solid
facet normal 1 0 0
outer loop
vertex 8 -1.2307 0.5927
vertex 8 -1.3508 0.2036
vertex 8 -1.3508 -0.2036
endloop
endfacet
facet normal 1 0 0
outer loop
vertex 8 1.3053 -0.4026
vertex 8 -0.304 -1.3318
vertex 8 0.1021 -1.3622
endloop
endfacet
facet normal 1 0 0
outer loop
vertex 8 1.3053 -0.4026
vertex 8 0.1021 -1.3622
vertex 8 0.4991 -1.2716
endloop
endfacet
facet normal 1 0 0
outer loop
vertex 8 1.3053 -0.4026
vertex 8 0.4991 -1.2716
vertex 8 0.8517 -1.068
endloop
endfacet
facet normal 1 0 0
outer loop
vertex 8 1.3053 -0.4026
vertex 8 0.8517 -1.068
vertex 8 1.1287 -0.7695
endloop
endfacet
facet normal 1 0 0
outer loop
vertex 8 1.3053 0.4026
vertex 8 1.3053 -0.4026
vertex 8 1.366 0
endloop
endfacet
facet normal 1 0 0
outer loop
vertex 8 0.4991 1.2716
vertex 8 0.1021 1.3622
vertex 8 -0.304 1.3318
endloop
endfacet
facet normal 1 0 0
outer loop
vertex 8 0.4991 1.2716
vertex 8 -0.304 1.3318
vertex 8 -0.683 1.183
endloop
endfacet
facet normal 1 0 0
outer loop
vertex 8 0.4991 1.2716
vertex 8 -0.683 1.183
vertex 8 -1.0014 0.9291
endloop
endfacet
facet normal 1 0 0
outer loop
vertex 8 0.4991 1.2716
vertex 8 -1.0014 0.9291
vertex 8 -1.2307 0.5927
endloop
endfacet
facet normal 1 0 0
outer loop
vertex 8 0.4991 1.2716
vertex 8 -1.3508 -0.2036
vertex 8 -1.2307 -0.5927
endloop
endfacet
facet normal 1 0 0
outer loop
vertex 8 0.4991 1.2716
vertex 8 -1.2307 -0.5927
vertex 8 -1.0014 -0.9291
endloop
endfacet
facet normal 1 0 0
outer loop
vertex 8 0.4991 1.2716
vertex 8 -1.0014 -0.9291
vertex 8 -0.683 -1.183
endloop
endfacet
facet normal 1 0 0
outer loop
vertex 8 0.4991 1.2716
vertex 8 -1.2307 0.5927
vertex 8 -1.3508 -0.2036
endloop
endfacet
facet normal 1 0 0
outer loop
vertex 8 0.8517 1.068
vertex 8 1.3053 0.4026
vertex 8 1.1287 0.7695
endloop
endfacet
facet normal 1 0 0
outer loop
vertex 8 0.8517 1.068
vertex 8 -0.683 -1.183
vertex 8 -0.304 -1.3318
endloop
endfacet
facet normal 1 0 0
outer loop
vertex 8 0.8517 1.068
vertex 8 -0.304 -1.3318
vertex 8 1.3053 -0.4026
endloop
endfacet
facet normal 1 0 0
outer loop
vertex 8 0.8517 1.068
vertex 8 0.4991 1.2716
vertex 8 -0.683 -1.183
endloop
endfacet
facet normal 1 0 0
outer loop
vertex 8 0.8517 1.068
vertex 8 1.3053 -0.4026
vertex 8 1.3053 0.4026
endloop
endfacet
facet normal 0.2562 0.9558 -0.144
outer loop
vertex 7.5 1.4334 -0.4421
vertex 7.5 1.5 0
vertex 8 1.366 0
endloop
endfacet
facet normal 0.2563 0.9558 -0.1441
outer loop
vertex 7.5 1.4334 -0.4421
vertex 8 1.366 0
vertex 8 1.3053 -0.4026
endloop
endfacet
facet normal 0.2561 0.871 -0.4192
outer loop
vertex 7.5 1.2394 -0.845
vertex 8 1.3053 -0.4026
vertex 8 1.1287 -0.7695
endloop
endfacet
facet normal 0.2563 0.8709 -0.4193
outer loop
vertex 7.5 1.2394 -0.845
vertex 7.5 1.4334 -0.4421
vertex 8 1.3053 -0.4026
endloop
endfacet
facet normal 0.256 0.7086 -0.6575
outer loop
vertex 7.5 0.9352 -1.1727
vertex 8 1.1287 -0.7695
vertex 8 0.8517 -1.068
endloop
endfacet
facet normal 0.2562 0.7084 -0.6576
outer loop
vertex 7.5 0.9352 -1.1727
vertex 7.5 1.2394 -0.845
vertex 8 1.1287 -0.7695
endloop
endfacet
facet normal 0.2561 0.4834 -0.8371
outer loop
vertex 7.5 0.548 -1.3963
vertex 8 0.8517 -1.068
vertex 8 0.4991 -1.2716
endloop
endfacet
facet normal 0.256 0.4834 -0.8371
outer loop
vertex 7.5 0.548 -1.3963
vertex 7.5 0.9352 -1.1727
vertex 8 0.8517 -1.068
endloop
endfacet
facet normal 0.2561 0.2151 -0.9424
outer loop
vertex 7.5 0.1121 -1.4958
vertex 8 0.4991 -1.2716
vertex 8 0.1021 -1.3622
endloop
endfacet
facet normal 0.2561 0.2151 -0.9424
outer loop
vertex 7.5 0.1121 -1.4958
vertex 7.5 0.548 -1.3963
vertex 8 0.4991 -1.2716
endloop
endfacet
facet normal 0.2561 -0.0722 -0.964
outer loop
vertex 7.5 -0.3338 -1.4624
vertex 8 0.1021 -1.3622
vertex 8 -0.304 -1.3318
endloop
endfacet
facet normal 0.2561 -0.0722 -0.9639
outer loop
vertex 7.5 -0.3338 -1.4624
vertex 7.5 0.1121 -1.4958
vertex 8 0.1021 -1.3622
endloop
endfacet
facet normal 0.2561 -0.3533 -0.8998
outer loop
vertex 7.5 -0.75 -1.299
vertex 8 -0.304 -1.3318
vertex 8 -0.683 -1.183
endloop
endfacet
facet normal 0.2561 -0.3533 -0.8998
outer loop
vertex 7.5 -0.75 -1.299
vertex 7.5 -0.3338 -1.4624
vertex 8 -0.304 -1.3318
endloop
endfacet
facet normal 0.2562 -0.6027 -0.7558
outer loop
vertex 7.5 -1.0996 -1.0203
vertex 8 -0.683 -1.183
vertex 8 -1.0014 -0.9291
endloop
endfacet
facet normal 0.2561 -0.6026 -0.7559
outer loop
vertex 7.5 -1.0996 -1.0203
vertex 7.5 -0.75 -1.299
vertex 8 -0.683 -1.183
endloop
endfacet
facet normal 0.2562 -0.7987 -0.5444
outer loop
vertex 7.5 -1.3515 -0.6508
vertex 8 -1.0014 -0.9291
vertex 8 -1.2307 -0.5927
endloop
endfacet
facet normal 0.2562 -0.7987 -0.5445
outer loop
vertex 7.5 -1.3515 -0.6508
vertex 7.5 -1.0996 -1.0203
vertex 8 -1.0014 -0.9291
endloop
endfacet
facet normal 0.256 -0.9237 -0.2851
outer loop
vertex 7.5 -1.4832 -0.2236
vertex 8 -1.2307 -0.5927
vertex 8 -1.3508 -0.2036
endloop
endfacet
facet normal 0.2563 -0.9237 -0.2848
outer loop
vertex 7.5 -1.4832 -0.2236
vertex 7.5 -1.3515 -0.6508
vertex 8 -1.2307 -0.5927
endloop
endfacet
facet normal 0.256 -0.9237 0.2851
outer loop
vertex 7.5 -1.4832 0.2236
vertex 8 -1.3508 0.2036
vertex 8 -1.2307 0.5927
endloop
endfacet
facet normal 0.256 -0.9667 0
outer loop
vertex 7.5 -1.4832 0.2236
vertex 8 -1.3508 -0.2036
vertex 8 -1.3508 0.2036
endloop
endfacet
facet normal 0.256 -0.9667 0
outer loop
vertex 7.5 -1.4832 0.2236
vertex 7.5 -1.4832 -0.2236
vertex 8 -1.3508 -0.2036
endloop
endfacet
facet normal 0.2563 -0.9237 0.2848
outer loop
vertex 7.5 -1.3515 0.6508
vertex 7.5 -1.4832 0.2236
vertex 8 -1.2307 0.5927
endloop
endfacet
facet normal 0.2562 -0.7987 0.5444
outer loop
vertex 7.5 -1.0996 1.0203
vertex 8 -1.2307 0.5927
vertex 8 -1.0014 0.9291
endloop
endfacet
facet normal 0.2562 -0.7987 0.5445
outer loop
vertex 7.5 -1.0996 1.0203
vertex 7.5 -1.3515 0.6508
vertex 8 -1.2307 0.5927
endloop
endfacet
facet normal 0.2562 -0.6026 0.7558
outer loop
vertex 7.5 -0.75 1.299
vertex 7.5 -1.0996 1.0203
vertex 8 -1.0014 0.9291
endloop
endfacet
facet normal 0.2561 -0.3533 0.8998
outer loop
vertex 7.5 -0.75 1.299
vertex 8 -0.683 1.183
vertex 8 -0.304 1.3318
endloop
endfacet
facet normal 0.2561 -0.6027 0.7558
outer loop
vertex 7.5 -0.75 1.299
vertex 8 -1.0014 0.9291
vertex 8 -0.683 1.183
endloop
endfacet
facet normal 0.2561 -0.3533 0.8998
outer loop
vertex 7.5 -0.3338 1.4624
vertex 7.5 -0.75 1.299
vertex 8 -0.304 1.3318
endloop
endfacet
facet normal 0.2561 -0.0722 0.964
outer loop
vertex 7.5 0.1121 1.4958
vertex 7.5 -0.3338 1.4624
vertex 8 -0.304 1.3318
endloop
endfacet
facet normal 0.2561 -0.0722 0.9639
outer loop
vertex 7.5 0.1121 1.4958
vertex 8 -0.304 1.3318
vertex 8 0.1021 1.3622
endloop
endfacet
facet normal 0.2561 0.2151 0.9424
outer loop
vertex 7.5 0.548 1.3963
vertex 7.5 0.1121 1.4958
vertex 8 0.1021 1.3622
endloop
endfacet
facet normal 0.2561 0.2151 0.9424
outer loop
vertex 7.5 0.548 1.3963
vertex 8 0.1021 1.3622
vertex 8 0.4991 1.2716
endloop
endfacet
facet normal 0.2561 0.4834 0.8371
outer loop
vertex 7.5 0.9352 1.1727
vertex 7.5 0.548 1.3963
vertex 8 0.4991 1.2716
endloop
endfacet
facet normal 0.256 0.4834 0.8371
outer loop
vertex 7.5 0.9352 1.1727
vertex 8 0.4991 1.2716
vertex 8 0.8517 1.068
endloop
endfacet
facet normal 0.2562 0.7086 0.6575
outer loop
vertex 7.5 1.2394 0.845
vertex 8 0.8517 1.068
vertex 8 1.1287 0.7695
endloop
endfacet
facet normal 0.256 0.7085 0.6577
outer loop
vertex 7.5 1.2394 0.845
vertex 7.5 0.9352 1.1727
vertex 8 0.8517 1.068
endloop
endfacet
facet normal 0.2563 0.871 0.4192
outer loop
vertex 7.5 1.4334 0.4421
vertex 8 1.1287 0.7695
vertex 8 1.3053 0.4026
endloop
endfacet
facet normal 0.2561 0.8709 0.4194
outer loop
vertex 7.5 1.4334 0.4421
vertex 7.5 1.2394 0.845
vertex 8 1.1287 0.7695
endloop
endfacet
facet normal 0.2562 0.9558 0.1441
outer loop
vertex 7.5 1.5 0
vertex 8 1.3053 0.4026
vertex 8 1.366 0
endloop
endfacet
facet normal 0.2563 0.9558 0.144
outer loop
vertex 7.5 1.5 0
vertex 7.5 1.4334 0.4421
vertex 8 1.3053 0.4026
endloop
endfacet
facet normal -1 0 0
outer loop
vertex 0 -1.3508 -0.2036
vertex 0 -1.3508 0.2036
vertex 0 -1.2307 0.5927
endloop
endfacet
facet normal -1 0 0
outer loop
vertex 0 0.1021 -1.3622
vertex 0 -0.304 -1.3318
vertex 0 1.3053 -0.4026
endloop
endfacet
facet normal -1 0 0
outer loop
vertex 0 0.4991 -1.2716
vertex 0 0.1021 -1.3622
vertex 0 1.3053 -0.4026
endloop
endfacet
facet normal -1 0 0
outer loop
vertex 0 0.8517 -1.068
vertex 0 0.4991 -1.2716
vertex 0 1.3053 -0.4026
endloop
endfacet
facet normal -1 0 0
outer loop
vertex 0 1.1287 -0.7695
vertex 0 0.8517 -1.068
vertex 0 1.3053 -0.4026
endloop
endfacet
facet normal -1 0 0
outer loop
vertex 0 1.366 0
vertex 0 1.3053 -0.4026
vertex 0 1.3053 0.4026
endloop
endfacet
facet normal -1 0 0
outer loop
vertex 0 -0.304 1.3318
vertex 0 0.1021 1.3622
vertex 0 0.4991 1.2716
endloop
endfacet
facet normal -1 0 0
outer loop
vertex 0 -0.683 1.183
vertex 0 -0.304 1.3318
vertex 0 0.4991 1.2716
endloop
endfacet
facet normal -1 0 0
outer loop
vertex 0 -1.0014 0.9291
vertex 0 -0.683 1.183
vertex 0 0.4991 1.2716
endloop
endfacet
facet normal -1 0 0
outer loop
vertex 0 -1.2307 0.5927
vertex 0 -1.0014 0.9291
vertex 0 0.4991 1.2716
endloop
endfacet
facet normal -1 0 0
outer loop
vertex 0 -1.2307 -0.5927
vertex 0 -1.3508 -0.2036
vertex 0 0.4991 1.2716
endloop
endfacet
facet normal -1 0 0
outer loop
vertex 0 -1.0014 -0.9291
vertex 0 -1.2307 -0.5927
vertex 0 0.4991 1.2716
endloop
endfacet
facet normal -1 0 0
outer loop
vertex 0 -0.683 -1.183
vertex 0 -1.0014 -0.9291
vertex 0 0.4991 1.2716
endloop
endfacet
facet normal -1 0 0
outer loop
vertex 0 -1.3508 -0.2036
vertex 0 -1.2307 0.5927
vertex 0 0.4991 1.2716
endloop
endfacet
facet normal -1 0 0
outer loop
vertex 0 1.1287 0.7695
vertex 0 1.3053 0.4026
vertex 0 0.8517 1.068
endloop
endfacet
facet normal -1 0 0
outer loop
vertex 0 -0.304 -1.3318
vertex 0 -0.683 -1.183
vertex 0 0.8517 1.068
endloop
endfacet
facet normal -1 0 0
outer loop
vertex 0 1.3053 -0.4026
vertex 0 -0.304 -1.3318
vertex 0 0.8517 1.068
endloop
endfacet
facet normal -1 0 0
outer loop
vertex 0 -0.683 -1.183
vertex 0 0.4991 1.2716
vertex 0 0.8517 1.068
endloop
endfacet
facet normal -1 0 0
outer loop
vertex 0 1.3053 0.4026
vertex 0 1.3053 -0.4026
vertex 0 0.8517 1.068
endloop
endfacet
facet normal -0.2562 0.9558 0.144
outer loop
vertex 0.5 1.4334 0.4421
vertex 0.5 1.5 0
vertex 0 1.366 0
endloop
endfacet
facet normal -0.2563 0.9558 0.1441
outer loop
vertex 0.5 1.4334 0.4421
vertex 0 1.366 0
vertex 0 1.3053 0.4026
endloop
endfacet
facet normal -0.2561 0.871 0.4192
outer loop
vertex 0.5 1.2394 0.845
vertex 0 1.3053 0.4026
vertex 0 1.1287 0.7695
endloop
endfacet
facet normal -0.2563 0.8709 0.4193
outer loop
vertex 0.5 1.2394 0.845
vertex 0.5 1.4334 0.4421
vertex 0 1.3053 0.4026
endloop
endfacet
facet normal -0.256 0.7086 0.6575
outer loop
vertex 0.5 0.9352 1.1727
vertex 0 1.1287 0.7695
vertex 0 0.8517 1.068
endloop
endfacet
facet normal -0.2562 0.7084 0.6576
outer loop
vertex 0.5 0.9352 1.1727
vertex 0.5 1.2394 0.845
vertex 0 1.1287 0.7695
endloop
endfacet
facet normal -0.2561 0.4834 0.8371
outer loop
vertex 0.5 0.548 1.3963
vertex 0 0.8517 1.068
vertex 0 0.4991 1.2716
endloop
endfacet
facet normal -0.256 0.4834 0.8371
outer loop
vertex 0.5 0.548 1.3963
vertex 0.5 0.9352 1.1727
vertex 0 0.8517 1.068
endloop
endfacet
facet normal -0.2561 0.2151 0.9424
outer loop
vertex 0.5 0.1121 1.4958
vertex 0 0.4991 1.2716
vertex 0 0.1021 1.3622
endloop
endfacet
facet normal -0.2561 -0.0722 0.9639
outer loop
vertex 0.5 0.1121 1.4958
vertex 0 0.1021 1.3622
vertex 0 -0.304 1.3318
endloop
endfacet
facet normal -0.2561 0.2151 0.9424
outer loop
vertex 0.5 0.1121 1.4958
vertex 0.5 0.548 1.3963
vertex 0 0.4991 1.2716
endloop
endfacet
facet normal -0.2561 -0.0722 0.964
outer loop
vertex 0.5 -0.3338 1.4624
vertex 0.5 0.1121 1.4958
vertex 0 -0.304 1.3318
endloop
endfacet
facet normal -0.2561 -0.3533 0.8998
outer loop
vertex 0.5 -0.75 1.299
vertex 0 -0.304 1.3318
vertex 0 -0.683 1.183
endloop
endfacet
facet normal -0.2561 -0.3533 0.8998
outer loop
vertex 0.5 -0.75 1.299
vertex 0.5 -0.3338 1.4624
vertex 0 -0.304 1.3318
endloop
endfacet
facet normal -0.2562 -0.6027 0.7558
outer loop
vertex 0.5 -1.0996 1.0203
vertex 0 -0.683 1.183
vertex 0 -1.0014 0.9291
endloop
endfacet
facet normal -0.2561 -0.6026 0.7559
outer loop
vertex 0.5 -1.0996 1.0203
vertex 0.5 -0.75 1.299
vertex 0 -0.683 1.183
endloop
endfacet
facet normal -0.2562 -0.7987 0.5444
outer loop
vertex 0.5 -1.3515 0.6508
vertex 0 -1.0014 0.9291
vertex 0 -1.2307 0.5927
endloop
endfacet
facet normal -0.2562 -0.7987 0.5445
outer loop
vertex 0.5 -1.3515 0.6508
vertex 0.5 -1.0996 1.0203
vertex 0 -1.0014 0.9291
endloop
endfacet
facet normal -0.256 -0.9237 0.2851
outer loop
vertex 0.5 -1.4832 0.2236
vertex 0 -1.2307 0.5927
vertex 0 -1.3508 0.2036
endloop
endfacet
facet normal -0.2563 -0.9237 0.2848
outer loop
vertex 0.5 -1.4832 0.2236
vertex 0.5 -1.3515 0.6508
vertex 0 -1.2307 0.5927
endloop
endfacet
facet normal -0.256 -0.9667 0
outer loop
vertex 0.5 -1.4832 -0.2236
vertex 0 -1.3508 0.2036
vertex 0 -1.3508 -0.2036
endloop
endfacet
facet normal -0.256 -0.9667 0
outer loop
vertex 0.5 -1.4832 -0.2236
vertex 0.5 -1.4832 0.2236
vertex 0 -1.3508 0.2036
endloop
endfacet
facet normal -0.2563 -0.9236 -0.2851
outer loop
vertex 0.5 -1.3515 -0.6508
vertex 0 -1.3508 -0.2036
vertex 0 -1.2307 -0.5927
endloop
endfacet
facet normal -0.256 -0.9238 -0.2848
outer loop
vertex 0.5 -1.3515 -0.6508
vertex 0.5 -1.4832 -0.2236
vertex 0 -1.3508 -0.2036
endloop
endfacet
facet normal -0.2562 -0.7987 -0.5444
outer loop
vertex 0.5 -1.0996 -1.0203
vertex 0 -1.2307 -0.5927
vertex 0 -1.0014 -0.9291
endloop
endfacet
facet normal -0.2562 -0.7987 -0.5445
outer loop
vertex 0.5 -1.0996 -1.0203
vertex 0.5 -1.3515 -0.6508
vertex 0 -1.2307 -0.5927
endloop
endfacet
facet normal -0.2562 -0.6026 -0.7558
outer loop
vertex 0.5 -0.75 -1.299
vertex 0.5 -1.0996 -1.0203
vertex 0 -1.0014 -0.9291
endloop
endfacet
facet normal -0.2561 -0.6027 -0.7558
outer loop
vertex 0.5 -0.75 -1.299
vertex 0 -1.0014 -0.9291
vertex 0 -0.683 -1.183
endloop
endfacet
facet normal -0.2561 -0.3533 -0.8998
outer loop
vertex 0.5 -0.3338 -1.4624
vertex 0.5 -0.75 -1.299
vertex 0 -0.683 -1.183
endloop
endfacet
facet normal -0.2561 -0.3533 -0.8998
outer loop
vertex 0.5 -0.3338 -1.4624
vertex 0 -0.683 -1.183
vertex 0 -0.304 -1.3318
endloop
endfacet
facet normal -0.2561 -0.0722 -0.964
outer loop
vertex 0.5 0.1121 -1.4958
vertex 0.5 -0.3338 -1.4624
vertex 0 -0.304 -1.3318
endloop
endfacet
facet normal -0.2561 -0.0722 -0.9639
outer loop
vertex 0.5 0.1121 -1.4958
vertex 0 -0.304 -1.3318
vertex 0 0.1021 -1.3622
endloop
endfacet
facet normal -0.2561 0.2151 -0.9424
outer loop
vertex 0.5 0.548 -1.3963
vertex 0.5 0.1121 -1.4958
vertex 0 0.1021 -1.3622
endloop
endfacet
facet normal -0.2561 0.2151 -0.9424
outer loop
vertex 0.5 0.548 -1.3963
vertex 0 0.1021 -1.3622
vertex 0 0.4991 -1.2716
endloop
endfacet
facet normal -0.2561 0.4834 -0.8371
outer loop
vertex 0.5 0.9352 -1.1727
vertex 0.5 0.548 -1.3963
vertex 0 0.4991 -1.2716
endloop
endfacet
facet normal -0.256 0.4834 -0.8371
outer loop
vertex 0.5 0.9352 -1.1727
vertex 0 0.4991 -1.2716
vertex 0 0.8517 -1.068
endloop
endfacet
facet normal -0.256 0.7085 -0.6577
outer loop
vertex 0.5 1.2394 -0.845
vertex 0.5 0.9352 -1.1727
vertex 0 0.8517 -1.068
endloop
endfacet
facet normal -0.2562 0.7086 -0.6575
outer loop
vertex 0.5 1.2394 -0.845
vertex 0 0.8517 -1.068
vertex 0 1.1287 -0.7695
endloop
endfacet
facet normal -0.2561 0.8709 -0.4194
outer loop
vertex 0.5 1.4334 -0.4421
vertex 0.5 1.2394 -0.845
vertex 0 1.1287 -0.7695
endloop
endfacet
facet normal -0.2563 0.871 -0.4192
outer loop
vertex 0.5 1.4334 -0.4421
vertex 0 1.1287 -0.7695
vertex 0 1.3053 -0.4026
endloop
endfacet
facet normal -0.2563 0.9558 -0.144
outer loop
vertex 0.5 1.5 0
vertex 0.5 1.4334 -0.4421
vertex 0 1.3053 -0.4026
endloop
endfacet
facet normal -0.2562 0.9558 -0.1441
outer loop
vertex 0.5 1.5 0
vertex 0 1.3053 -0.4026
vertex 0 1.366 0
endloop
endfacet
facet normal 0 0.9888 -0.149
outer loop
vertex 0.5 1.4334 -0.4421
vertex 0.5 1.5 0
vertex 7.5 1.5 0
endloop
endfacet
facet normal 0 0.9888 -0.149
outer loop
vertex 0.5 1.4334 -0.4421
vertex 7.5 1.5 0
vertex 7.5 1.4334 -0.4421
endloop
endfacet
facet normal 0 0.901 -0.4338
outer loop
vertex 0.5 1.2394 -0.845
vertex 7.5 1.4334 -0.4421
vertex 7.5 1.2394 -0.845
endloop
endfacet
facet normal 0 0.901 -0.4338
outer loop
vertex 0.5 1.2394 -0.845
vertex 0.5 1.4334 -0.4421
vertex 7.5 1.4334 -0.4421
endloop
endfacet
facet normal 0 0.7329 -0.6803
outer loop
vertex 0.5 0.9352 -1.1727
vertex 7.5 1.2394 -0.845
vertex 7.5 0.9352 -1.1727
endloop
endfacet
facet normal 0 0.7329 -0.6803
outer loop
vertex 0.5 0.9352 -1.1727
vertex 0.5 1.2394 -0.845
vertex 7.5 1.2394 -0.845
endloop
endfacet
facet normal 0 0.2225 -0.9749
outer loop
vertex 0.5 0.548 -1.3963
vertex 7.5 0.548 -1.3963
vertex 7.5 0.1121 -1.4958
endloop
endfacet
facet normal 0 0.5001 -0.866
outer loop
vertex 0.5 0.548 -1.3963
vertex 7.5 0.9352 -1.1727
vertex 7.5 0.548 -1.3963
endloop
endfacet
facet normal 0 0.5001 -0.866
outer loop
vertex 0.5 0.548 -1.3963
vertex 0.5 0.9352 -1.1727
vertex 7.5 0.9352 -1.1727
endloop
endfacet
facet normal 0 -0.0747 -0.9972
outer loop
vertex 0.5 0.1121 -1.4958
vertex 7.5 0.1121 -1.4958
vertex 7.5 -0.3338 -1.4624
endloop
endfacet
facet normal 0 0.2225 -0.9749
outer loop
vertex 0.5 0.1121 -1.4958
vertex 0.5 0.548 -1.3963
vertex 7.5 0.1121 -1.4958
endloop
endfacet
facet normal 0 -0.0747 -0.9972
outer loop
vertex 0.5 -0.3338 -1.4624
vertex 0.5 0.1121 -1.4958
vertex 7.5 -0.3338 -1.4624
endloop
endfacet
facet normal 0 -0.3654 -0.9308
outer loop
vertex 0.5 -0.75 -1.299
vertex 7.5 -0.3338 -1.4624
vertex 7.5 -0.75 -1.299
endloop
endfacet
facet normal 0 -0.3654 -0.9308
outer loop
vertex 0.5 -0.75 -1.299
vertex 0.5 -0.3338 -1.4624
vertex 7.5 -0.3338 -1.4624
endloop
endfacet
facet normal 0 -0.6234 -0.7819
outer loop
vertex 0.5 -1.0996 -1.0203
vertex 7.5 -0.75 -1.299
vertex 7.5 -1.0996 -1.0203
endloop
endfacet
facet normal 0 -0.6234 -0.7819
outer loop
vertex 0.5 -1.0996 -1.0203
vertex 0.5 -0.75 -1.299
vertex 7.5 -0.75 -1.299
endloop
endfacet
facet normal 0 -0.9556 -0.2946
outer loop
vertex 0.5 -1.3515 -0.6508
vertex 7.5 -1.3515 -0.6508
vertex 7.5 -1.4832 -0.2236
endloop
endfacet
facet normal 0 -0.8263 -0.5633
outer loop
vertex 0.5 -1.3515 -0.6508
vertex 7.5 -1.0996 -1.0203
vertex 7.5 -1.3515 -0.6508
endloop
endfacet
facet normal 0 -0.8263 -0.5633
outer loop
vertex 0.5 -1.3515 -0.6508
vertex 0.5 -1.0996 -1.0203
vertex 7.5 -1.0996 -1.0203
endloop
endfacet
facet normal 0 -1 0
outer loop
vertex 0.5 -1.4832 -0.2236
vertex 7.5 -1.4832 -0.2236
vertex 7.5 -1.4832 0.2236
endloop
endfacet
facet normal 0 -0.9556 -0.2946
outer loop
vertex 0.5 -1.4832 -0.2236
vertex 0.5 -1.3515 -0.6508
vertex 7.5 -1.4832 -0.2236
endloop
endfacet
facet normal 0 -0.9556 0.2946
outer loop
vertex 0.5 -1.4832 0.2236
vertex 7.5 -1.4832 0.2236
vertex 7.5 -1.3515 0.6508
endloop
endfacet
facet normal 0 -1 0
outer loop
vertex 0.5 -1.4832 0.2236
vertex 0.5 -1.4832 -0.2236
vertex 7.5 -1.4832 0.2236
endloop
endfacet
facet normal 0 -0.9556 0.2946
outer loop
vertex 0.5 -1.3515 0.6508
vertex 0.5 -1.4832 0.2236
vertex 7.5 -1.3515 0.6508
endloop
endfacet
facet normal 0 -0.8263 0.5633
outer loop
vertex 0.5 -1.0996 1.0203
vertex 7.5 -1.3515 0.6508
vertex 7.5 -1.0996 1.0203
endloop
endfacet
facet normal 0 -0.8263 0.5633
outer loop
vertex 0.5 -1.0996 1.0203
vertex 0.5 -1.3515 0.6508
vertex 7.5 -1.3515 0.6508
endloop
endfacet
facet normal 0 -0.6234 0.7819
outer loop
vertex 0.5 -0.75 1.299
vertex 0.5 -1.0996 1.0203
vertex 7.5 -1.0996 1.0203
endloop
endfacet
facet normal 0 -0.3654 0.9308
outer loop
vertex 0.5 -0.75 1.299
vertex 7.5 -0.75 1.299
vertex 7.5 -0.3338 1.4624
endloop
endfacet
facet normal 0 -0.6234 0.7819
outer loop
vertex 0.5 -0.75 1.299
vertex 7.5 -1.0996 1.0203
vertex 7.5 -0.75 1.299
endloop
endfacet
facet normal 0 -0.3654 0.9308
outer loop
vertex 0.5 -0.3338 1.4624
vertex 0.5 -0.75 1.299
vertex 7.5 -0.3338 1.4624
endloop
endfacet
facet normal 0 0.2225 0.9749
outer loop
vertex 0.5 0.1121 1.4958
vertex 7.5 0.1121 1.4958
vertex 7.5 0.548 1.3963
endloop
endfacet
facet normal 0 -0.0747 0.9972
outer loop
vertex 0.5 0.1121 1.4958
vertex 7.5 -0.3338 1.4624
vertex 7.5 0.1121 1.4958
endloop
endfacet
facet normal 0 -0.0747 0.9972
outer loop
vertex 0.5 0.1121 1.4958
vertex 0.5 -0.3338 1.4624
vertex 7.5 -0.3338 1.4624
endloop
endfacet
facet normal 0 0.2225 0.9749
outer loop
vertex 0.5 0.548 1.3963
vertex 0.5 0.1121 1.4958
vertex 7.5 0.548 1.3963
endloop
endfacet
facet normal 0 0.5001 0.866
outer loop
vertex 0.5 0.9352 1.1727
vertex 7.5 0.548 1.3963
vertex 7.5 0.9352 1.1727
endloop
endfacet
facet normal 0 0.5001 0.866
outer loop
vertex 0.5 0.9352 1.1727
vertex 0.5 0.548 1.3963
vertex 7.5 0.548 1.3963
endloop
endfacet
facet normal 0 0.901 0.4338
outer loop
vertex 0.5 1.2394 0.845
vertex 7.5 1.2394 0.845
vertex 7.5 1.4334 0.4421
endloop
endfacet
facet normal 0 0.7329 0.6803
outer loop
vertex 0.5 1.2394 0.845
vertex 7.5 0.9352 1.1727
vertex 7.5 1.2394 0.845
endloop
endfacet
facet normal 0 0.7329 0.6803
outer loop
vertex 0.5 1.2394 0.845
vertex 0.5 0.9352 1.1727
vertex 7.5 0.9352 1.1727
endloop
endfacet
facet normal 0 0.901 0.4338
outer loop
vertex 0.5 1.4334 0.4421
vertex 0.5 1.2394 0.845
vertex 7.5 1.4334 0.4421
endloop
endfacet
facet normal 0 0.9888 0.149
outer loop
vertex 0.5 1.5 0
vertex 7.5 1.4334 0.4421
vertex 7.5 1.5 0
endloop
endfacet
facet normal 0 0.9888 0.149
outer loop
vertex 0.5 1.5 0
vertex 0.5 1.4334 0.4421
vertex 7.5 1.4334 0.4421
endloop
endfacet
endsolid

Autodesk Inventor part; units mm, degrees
ref_plane "YZ Plane" through (0, 0, 0) normal (1, 0, 0) x (0, 1, 0)
ref_plane "XZ Plane" through (0, 0, 0) normal (0, 1, 0) x (-1, 0, 0)
ref_plane "XY Plane" through (0, 0, 0) normal (0, 0, 1) x (1, 0, 0)
sketch "Skizze" plane through (0, 0, 0) normal (1, 0, 0) x (0, 1, 0)
  circle A0 centre (0, 0) radius 1.5
  dimension "d1" = 3
extrude "Körper" add sketch "Skizze" along normal blind 8
chamfer "Fase1" distance 0.5 angle 15 1 edges at (0, -1.5, 0) measured on face at (5.3333, 1.4951, -0.1207)
chamfer "Skizze2" distance 0.5 angle 15 1 edges at (8, -1.5, 0) measured on face at (5.5, 1.4951, -0.1207)
equation "\"d1\" = NND"
equation "\"d2\" = NLG"
equation "\"d8\" = PHH"
equation "\"d9\" = FAWI"
equation "\"d12\" = PHH"
equation "\"d4\" = PHH"
equation "\"d5\" = FAWI"
equation "\"d11\" = PHH"
equation "\"NND\" = 3"
equation "\"NLG\" = 8"
equation "\"PHH\" = 0.5"
equation "\"FAWI\" = 15deg"
equation "\"KAH\" = 0"
properties part number "ISO 2338 - 3 m6 x 8" material "Edelstahl, austenitisch"
